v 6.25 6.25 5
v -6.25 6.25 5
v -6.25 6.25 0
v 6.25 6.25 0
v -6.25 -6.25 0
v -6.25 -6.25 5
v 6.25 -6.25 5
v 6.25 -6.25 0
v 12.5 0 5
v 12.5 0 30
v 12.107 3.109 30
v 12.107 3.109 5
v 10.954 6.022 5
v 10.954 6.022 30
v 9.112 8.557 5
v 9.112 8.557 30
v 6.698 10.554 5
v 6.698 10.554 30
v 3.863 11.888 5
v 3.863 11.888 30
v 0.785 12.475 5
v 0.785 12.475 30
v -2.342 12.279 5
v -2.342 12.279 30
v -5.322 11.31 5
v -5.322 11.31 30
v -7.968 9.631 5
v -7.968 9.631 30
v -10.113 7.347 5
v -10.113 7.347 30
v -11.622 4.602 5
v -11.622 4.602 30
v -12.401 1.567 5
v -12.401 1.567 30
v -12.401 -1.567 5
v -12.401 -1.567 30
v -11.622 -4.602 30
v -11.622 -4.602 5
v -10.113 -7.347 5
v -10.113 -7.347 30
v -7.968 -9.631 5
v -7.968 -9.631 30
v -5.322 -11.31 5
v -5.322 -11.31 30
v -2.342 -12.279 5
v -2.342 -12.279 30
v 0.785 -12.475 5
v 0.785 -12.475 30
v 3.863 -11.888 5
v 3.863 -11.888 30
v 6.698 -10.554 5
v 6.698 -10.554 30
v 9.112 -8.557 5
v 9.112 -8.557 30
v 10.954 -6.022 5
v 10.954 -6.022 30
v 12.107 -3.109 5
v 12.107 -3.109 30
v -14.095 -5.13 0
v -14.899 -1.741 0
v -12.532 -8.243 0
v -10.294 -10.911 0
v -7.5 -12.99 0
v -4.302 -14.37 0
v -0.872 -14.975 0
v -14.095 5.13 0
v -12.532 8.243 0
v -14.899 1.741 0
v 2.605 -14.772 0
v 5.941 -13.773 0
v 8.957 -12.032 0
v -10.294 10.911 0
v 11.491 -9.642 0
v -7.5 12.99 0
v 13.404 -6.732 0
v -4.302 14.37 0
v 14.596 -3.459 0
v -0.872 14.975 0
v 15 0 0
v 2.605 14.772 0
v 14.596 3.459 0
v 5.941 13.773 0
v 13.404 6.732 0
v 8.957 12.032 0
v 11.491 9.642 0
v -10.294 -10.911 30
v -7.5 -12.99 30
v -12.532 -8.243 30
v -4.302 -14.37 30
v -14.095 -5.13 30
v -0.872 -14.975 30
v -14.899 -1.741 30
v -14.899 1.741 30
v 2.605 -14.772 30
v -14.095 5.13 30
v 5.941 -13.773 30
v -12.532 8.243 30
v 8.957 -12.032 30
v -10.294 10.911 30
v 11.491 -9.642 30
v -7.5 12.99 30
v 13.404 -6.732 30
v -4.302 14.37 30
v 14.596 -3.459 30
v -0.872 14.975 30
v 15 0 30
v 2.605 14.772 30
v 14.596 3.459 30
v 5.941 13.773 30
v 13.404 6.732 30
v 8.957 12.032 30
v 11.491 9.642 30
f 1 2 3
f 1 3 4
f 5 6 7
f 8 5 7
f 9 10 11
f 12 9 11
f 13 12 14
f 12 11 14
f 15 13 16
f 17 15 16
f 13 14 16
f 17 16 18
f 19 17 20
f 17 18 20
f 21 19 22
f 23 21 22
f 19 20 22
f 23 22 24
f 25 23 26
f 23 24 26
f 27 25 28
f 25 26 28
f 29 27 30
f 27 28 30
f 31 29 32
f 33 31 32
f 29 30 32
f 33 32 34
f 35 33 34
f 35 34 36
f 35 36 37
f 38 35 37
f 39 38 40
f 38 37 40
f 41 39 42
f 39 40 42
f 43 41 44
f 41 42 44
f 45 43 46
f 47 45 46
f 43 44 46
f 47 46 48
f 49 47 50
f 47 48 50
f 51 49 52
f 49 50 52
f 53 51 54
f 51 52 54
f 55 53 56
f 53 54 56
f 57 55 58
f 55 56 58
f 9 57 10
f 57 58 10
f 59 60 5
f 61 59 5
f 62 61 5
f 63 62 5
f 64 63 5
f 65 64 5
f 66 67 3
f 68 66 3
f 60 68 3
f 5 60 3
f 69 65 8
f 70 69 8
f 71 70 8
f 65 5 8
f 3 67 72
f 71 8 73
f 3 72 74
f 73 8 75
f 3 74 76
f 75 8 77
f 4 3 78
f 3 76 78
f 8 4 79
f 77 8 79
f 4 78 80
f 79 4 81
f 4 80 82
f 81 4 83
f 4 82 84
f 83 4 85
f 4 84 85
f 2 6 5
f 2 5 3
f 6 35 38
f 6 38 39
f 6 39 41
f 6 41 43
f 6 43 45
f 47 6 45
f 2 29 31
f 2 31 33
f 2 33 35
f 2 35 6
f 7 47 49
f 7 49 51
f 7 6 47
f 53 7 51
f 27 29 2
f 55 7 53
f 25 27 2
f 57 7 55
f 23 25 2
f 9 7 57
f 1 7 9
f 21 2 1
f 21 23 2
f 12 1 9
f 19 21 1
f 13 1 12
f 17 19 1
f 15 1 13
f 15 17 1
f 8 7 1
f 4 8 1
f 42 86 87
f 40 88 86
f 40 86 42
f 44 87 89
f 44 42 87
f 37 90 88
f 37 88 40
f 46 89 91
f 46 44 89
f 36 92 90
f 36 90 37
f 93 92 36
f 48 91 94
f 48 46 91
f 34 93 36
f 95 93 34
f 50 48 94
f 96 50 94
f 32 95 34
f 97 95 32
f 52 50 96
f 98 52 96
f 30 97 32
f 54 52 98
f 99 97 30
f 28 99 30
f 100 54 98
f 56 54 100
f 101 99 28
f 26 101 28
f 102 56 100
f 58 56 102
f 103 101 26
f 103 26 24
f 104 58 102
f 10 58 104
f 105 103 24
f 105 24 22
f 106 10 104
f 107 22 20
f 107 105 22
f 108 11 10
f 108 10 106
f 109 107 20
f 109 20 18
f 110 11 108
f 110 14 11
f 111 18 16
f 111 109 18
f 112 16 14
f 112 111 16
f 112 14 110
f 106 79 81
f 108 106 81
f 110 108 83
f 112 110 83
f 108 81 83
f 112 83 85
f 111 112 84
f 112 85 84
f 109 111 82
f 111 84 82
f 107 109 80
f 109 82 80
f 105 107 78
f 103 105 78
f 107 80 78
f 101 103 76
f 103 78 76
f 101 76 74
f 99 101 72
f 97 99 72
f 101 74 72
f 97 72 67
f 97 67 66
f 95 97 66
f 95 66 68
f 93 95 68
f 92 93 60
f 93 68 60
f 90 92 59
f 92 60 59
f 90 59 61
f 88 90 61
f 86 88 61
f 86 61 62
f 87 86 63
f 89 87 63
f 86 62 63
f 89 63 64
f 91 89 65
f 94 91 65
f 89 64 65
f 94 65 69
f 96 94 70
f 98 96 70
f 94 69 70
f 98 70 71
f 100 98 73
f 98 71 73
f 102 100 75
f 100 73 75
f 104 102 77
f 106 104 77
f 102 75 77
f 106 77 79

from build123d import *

# Parameters (mm, degrees)
F0_R     = 15
F1_DEPTH = 30
F2_R     = 12.5
F3_DEPTH = 25
F4_W     = 12.5
F4_H     = 12.5
F5_DEPTH = 5.001


with BuildPart() as f1:
    # F0 (on Top) → F1 (new body)
    with BuildSketch(Plane.XY):
        Circle(F0_R)
    extrude(amount=F1_DEPTH)

    # F2 (on face) → F3 (cut)
    with BuildSketch(Plane.XY.offset(30)):
        Circle(F2_R)
    extrude(amount=-F3_DEPTH, mode=Mode.SUBTRACT)

    # F4 (on face) → F5 (cut, through all)
    with BuildSketch(Plane.XY.offset(5)):
        Rectangle(F4_W, F4_H)
    extrude(amount=-F5_DEPTH, mode=Mode.SUBTRACT)


solid = f1.part
